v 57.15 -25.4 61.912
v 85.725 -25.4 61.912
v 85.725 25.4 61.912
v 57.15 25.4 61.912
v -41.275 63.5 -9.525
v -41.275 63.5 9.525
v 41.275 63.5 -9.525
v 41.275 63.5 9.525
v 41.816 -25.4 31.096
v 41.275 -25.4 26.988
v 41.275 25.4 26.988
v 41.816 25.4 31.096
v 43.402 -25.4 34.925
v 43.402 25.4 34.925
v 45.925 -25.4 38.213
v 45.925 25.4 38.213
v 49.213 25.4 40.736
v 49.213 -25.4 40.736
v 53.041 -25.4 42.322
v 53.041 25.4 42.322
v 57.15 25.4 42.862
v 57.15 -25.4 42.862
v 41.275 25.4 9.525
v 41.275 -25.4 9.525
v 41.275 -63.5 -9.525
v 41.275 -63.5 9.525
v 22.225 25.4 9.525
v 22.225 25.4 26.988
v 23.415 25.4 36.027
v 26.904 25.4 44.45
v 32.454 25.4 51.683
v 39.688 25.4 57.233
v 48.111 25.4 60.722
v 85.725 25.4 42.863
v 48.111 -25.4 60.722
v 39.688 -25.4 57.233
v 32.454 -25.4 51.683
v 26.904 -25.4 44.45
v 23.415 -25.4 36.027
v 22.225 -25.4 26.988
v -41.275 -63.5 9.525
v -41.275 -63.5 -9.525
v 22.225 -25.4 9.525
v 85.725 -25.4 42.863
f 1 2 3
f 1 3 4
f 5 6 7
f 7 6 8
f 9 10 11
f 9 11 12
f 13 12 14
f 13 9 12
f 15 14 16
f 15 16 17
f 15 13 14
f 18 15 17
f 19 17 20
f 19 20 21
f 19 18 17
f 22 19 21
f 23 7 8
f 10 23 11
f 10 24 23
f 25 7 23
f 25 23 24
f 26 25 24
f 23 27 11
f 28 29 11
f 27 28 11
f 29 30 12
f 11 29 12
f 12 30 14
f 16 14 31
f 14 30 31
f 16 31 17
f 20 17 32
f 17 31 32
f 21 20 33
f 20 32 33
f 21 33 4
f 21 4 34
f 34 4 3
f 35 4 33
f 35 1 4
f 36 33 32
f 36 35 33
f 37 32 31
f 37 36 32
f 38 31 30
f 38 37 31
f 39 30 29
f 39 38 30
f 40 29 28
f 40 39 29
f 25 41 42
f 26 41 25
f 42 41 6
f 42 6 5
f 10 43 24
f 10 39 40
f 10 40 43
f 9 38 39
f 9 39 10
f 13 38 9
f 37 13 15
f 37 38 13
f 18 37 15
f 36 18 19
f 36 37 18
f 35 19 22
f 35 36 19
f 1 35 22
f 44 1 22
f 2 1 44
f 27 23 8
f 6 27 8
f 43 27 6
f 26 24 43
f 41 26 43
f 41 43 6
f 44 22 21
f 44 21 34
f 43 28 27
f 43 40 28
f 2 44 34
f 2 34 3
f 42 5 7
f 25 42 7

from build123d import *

# Parameters (mm, degrees)
F1_DEPTH = 63.5
F0_W     = 25.4
F0_H     = 19.05
F2_DEPTH = 25.4


with BuildPart() as f1:
    # F0 (on Front) → F1 (new body, symmetric)
    with BuildSketch(Plane.XZ):
        Polygon((41.275, -9.525), (41.275, 9.525), (22.225, 9.525), (-41.275, 9.525), (-41.275, -9.525), align=None)
    extrude(amount=F1_DEPTH, both=True)

    # F0 (on Front) → F2 (join, symmetric)
    with BuildSketch(Plane.XZ):
        with BuildLine():
            Line((22.225, 9.525), (41.275, 9.525))
            Line((41.275, 9.525), (41.275, 26.9875))
            ThreePointArc((41.275, 26.9875), (45.92468, 38.21282), (57.15, 42.8625))
            Line((57.15, 42.8625), (60.325, 42.8625))
            Line((60.325, 42.8625), (60.325, 61.9125))
            Line((60.325, 61.9125), (57.15, 61.9125))
            ThreePointArc((57.15, 61.9125), (32.454296, 51.683204), (22.225, 26.9875))
            Line((22.225, 26.9875), (22.225, 9.525))
        make_face()
        with Locations((73.025, 52.3875)):
            Rectangle(F0_W, F0_H)
    extrude(amount=F2_DEPTH, both=True)


solid = f1.part
